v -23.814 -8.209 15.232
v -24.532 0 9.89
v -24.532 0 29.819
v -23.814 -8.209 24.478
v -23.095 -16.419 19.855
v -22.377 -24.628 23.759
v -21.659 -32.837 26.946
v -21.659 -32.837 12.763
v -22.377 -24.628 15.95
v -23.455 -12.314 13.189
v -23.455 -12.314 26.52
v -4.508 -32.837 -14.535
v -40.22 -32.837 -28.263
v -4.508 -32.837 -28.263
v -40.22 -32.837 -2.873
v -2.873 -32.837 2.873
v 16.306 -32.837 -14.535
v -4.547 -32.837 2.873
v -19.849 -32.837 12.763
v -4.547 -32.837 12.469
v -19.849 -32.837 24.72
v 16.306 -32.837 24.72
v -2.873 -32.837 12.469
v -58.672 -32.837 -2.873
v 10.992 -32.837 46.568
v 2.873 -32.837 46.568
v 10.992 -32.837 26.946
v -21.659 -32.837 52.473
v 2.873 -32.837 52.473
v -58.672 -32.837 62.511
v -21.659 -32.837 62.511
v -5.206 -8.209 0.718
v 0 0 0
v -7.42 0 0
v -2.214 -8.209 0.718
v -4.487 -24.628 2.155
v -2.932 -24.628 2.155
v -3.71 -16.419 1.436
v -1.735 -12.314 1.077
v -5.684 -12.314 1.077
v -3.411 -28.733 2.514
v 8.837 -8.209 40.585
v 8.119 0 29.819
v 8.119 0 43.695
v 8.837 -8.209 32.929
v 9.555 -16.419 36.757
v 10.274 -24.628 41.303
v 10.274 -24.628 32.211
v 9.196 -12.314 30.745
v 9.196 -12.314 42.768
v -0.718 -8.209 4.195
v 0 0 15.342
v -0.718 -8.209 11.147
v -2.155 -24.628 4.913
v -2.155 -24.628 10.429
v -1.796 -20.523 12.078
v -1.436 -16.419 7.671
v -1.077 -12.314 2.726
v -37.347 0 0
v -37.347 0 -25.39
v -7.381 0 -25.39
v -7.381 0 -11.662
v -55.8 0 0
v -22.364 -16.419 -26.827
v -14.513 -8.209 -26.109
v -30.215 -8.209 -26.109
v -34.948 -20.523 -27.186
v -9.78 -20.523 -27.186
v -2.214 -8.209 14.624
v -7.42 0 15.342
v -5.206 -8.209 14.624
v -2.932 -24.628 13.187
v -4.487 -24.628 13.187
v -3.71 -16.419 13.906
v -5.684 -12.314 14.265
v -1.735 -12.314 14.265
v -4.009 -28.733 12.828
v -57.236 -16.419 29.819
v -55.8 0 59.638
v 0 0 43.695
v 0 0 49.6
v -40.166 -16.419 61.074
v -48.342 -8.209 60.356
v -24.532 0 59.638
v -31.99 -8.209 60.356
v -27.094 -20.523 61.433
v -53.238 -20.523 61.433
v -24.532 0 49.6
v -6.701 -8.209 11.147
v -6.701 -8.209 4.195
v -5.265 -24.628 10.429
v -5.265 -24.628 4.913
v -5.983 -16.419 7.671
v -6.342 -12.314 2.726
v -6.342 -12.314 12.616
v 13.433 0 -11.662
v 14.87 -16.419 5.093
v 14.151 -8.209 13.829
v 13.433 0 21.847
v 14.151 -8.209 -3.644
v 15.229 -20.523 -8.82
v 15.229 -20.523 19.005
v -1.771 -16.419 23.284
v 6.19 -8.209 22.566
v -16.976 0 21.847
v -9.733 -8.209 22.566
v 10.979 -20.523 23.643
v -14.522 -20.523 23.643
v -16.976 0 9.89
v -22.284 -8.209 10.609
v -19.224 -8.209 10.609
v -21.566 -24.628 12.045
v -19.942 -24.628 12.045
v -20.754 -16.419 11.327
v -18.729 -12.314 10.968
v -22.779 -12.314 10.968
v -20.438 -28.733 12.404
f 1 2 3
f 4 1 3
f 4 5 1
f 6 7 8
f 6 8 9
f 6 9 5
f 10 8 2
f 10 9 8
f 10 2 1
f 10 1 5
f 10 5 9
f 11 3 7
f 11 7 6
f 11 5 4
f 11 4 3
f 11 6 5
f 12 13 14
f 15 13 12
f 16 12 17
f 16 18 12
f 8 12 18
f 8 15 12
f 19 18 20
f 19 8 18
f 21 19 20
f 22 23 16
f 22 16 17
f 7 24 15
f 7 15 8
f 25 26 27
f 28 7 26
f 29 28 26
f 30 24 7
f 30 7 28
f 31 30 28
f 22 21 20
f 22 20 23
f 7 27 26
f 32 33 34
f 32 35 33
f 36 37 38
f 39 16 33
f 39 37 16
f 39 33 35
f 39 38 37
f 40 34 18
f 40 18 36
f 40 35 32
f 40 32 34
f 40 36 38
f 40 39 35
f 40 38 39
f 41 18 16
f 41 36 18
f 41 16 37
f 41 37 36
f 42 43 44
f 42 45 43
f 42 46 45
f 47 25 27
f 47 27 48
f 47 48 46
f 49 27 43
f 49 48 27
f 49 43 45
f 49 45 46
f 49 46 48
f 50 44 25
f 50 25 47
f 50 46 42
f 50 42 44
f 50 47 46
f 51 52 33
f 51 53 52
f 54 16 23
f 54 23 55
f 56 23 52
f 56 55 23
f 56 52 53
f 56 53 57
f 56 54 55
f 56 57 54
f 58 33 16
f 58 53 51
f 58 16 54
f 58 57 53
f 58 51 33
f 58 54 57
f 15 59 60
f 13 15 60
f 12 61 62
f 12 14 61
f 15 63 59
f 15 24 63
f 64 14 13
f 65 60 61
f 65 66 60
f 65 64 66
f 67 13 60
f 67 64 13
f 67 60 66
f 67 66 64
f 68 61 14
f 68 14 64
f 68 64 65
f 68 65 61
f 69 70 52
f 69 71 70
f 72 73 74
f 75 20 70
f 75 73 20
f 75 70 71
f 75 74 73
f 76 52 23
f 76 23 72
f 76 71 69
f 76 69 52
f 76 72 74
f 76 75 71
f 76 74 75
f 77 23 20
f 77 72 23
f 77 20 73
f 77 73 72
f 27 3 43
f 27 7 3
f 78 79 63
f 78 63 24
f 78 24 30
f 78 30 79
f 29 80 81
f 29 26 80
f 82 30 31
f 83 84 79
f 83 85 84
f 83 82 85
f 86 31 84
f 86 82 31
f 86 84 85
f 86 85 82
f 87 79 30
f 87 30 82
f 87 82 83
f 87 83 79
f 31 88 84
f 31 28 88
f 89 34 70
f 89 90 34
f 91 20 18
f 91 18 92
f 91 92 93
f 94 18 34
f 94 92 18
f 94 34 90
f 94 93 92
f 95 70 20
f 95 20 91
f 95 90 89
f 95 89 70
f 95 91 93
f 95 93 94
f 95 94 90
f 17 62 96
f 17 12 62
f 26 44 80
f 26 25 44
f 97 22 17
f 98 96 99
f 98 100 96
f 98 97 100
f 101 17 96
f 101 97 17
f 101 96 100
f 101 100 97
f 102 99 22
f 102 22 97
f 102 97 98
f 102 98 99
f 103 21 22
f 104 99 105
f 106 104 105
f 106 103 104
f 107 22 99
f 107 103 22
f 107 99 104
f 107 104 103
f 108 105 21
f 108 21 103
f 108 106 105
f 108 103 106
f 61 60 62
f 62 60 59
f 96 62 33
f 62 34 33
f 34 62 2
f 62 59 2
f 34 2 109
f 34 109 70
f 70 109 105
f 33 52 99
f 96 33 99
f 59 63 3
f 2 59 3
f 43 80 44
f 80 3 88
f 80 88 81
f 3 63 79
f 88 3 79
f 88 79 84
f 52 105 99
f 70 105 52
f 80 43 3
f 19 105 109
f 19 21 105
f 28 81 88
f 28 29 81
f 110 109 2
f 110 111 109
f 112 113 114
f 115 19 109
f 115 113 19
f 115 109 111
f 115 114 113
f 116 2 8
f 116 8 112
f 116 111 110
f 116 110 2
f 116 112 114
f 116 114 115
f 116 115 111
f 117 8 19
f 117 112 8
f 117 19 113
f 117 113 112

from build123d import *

# Parameters (mm, degrees)
F0_W     = 12.8154978156
F0_H     = 9.8903924227
F0_W_2   = 24.5318338275
F0_H_2   = 5.9047192335
F1_DEPTH = 32.8371524811
F1_TAPER = -5


with BuildPart() as f1:
    # F0 (on Front) → F1 (new body)
    with BuildSketch(Plane.XZ):
        with Locations((-30.9395827353, 4.9451962113)):
            Rectangle(F0_W, F0_H)
        Polygon((-7.419615984, 0), (-7.419615984, 9.8903924227), (-16.976043582, 9.8903924227), (-16.976043582, -11.6618275642), (-7.380887866, -11.6618275642), (-7.380887866, 0), align=None)
        Polygon((-24.5318338275, 37.7901867032), (-24.5318338275, 29.8188216984), (8.1190019846, 29.8188216984), (8.1190019846, 43.6949059367), (0, 43.6949059367), (0, 37.7901867032), align=None)
        with Locations((-12.2659169137, 40.74254632)):
            Rectangle(F0_W_2, F0_H_2)
        with Locations((-12.2659169137, 46.6472655535)):
            Rectangle(F0_W_2, F0_H_2)
        Polygon((-7.419615984, 15.3419598937), (0, 15.3419598937), (0, 0), (-7.380887866, 0), (-7.380887866, -11.6618275642), (13.4332478046, -11.6618275642), (13.4332478046, 21.8474492431), (-16.976043582, 21.8474492431), (-16.976043582, 9.8903924227), (-7.419615984, 9.8903924227), align=None)
        Polygon((-16.976043582, -11.6618275642), (-16.976043582, 9.8903924227), (-24.5318338275, 9.8903924227), (-24.5318338275, 0), (-37.3473316431, 0), (-37.3473316431, -25.3902971745), (-7.380887866, -25.3902971745), (-7.380887866, -11.6618275642), align=None)
        Polygon((-35.7235372066, 29.8188216984), (-24.5318338275, 29.8188216984), (-24.5318338275, 37.7901867032), (-24.5318338275, 43.6949059367), (-35.7235372066, 43.6949059367), align=None)
        Polygon((-37.3473316431, 9.8903924227), (-24.5318338275, 9.8903924227), (-24.5318338275, 29.8188216984), (-35.7235372066, 29.8188216984), (-35.7235372066, 43.6949059367), (-24.5318338275, 43.6949059367), (-24.5318338275, 49.5996251702), (-24.5318338275, 59.6376433969), (-55.7995736599, 59.6376433969), (-55.7995736599, 0), (-37.3473316431, 0), align=None)
    extrude(amount=F1_DEPTH, taper=F1_TAPER)


solid = f1.part
